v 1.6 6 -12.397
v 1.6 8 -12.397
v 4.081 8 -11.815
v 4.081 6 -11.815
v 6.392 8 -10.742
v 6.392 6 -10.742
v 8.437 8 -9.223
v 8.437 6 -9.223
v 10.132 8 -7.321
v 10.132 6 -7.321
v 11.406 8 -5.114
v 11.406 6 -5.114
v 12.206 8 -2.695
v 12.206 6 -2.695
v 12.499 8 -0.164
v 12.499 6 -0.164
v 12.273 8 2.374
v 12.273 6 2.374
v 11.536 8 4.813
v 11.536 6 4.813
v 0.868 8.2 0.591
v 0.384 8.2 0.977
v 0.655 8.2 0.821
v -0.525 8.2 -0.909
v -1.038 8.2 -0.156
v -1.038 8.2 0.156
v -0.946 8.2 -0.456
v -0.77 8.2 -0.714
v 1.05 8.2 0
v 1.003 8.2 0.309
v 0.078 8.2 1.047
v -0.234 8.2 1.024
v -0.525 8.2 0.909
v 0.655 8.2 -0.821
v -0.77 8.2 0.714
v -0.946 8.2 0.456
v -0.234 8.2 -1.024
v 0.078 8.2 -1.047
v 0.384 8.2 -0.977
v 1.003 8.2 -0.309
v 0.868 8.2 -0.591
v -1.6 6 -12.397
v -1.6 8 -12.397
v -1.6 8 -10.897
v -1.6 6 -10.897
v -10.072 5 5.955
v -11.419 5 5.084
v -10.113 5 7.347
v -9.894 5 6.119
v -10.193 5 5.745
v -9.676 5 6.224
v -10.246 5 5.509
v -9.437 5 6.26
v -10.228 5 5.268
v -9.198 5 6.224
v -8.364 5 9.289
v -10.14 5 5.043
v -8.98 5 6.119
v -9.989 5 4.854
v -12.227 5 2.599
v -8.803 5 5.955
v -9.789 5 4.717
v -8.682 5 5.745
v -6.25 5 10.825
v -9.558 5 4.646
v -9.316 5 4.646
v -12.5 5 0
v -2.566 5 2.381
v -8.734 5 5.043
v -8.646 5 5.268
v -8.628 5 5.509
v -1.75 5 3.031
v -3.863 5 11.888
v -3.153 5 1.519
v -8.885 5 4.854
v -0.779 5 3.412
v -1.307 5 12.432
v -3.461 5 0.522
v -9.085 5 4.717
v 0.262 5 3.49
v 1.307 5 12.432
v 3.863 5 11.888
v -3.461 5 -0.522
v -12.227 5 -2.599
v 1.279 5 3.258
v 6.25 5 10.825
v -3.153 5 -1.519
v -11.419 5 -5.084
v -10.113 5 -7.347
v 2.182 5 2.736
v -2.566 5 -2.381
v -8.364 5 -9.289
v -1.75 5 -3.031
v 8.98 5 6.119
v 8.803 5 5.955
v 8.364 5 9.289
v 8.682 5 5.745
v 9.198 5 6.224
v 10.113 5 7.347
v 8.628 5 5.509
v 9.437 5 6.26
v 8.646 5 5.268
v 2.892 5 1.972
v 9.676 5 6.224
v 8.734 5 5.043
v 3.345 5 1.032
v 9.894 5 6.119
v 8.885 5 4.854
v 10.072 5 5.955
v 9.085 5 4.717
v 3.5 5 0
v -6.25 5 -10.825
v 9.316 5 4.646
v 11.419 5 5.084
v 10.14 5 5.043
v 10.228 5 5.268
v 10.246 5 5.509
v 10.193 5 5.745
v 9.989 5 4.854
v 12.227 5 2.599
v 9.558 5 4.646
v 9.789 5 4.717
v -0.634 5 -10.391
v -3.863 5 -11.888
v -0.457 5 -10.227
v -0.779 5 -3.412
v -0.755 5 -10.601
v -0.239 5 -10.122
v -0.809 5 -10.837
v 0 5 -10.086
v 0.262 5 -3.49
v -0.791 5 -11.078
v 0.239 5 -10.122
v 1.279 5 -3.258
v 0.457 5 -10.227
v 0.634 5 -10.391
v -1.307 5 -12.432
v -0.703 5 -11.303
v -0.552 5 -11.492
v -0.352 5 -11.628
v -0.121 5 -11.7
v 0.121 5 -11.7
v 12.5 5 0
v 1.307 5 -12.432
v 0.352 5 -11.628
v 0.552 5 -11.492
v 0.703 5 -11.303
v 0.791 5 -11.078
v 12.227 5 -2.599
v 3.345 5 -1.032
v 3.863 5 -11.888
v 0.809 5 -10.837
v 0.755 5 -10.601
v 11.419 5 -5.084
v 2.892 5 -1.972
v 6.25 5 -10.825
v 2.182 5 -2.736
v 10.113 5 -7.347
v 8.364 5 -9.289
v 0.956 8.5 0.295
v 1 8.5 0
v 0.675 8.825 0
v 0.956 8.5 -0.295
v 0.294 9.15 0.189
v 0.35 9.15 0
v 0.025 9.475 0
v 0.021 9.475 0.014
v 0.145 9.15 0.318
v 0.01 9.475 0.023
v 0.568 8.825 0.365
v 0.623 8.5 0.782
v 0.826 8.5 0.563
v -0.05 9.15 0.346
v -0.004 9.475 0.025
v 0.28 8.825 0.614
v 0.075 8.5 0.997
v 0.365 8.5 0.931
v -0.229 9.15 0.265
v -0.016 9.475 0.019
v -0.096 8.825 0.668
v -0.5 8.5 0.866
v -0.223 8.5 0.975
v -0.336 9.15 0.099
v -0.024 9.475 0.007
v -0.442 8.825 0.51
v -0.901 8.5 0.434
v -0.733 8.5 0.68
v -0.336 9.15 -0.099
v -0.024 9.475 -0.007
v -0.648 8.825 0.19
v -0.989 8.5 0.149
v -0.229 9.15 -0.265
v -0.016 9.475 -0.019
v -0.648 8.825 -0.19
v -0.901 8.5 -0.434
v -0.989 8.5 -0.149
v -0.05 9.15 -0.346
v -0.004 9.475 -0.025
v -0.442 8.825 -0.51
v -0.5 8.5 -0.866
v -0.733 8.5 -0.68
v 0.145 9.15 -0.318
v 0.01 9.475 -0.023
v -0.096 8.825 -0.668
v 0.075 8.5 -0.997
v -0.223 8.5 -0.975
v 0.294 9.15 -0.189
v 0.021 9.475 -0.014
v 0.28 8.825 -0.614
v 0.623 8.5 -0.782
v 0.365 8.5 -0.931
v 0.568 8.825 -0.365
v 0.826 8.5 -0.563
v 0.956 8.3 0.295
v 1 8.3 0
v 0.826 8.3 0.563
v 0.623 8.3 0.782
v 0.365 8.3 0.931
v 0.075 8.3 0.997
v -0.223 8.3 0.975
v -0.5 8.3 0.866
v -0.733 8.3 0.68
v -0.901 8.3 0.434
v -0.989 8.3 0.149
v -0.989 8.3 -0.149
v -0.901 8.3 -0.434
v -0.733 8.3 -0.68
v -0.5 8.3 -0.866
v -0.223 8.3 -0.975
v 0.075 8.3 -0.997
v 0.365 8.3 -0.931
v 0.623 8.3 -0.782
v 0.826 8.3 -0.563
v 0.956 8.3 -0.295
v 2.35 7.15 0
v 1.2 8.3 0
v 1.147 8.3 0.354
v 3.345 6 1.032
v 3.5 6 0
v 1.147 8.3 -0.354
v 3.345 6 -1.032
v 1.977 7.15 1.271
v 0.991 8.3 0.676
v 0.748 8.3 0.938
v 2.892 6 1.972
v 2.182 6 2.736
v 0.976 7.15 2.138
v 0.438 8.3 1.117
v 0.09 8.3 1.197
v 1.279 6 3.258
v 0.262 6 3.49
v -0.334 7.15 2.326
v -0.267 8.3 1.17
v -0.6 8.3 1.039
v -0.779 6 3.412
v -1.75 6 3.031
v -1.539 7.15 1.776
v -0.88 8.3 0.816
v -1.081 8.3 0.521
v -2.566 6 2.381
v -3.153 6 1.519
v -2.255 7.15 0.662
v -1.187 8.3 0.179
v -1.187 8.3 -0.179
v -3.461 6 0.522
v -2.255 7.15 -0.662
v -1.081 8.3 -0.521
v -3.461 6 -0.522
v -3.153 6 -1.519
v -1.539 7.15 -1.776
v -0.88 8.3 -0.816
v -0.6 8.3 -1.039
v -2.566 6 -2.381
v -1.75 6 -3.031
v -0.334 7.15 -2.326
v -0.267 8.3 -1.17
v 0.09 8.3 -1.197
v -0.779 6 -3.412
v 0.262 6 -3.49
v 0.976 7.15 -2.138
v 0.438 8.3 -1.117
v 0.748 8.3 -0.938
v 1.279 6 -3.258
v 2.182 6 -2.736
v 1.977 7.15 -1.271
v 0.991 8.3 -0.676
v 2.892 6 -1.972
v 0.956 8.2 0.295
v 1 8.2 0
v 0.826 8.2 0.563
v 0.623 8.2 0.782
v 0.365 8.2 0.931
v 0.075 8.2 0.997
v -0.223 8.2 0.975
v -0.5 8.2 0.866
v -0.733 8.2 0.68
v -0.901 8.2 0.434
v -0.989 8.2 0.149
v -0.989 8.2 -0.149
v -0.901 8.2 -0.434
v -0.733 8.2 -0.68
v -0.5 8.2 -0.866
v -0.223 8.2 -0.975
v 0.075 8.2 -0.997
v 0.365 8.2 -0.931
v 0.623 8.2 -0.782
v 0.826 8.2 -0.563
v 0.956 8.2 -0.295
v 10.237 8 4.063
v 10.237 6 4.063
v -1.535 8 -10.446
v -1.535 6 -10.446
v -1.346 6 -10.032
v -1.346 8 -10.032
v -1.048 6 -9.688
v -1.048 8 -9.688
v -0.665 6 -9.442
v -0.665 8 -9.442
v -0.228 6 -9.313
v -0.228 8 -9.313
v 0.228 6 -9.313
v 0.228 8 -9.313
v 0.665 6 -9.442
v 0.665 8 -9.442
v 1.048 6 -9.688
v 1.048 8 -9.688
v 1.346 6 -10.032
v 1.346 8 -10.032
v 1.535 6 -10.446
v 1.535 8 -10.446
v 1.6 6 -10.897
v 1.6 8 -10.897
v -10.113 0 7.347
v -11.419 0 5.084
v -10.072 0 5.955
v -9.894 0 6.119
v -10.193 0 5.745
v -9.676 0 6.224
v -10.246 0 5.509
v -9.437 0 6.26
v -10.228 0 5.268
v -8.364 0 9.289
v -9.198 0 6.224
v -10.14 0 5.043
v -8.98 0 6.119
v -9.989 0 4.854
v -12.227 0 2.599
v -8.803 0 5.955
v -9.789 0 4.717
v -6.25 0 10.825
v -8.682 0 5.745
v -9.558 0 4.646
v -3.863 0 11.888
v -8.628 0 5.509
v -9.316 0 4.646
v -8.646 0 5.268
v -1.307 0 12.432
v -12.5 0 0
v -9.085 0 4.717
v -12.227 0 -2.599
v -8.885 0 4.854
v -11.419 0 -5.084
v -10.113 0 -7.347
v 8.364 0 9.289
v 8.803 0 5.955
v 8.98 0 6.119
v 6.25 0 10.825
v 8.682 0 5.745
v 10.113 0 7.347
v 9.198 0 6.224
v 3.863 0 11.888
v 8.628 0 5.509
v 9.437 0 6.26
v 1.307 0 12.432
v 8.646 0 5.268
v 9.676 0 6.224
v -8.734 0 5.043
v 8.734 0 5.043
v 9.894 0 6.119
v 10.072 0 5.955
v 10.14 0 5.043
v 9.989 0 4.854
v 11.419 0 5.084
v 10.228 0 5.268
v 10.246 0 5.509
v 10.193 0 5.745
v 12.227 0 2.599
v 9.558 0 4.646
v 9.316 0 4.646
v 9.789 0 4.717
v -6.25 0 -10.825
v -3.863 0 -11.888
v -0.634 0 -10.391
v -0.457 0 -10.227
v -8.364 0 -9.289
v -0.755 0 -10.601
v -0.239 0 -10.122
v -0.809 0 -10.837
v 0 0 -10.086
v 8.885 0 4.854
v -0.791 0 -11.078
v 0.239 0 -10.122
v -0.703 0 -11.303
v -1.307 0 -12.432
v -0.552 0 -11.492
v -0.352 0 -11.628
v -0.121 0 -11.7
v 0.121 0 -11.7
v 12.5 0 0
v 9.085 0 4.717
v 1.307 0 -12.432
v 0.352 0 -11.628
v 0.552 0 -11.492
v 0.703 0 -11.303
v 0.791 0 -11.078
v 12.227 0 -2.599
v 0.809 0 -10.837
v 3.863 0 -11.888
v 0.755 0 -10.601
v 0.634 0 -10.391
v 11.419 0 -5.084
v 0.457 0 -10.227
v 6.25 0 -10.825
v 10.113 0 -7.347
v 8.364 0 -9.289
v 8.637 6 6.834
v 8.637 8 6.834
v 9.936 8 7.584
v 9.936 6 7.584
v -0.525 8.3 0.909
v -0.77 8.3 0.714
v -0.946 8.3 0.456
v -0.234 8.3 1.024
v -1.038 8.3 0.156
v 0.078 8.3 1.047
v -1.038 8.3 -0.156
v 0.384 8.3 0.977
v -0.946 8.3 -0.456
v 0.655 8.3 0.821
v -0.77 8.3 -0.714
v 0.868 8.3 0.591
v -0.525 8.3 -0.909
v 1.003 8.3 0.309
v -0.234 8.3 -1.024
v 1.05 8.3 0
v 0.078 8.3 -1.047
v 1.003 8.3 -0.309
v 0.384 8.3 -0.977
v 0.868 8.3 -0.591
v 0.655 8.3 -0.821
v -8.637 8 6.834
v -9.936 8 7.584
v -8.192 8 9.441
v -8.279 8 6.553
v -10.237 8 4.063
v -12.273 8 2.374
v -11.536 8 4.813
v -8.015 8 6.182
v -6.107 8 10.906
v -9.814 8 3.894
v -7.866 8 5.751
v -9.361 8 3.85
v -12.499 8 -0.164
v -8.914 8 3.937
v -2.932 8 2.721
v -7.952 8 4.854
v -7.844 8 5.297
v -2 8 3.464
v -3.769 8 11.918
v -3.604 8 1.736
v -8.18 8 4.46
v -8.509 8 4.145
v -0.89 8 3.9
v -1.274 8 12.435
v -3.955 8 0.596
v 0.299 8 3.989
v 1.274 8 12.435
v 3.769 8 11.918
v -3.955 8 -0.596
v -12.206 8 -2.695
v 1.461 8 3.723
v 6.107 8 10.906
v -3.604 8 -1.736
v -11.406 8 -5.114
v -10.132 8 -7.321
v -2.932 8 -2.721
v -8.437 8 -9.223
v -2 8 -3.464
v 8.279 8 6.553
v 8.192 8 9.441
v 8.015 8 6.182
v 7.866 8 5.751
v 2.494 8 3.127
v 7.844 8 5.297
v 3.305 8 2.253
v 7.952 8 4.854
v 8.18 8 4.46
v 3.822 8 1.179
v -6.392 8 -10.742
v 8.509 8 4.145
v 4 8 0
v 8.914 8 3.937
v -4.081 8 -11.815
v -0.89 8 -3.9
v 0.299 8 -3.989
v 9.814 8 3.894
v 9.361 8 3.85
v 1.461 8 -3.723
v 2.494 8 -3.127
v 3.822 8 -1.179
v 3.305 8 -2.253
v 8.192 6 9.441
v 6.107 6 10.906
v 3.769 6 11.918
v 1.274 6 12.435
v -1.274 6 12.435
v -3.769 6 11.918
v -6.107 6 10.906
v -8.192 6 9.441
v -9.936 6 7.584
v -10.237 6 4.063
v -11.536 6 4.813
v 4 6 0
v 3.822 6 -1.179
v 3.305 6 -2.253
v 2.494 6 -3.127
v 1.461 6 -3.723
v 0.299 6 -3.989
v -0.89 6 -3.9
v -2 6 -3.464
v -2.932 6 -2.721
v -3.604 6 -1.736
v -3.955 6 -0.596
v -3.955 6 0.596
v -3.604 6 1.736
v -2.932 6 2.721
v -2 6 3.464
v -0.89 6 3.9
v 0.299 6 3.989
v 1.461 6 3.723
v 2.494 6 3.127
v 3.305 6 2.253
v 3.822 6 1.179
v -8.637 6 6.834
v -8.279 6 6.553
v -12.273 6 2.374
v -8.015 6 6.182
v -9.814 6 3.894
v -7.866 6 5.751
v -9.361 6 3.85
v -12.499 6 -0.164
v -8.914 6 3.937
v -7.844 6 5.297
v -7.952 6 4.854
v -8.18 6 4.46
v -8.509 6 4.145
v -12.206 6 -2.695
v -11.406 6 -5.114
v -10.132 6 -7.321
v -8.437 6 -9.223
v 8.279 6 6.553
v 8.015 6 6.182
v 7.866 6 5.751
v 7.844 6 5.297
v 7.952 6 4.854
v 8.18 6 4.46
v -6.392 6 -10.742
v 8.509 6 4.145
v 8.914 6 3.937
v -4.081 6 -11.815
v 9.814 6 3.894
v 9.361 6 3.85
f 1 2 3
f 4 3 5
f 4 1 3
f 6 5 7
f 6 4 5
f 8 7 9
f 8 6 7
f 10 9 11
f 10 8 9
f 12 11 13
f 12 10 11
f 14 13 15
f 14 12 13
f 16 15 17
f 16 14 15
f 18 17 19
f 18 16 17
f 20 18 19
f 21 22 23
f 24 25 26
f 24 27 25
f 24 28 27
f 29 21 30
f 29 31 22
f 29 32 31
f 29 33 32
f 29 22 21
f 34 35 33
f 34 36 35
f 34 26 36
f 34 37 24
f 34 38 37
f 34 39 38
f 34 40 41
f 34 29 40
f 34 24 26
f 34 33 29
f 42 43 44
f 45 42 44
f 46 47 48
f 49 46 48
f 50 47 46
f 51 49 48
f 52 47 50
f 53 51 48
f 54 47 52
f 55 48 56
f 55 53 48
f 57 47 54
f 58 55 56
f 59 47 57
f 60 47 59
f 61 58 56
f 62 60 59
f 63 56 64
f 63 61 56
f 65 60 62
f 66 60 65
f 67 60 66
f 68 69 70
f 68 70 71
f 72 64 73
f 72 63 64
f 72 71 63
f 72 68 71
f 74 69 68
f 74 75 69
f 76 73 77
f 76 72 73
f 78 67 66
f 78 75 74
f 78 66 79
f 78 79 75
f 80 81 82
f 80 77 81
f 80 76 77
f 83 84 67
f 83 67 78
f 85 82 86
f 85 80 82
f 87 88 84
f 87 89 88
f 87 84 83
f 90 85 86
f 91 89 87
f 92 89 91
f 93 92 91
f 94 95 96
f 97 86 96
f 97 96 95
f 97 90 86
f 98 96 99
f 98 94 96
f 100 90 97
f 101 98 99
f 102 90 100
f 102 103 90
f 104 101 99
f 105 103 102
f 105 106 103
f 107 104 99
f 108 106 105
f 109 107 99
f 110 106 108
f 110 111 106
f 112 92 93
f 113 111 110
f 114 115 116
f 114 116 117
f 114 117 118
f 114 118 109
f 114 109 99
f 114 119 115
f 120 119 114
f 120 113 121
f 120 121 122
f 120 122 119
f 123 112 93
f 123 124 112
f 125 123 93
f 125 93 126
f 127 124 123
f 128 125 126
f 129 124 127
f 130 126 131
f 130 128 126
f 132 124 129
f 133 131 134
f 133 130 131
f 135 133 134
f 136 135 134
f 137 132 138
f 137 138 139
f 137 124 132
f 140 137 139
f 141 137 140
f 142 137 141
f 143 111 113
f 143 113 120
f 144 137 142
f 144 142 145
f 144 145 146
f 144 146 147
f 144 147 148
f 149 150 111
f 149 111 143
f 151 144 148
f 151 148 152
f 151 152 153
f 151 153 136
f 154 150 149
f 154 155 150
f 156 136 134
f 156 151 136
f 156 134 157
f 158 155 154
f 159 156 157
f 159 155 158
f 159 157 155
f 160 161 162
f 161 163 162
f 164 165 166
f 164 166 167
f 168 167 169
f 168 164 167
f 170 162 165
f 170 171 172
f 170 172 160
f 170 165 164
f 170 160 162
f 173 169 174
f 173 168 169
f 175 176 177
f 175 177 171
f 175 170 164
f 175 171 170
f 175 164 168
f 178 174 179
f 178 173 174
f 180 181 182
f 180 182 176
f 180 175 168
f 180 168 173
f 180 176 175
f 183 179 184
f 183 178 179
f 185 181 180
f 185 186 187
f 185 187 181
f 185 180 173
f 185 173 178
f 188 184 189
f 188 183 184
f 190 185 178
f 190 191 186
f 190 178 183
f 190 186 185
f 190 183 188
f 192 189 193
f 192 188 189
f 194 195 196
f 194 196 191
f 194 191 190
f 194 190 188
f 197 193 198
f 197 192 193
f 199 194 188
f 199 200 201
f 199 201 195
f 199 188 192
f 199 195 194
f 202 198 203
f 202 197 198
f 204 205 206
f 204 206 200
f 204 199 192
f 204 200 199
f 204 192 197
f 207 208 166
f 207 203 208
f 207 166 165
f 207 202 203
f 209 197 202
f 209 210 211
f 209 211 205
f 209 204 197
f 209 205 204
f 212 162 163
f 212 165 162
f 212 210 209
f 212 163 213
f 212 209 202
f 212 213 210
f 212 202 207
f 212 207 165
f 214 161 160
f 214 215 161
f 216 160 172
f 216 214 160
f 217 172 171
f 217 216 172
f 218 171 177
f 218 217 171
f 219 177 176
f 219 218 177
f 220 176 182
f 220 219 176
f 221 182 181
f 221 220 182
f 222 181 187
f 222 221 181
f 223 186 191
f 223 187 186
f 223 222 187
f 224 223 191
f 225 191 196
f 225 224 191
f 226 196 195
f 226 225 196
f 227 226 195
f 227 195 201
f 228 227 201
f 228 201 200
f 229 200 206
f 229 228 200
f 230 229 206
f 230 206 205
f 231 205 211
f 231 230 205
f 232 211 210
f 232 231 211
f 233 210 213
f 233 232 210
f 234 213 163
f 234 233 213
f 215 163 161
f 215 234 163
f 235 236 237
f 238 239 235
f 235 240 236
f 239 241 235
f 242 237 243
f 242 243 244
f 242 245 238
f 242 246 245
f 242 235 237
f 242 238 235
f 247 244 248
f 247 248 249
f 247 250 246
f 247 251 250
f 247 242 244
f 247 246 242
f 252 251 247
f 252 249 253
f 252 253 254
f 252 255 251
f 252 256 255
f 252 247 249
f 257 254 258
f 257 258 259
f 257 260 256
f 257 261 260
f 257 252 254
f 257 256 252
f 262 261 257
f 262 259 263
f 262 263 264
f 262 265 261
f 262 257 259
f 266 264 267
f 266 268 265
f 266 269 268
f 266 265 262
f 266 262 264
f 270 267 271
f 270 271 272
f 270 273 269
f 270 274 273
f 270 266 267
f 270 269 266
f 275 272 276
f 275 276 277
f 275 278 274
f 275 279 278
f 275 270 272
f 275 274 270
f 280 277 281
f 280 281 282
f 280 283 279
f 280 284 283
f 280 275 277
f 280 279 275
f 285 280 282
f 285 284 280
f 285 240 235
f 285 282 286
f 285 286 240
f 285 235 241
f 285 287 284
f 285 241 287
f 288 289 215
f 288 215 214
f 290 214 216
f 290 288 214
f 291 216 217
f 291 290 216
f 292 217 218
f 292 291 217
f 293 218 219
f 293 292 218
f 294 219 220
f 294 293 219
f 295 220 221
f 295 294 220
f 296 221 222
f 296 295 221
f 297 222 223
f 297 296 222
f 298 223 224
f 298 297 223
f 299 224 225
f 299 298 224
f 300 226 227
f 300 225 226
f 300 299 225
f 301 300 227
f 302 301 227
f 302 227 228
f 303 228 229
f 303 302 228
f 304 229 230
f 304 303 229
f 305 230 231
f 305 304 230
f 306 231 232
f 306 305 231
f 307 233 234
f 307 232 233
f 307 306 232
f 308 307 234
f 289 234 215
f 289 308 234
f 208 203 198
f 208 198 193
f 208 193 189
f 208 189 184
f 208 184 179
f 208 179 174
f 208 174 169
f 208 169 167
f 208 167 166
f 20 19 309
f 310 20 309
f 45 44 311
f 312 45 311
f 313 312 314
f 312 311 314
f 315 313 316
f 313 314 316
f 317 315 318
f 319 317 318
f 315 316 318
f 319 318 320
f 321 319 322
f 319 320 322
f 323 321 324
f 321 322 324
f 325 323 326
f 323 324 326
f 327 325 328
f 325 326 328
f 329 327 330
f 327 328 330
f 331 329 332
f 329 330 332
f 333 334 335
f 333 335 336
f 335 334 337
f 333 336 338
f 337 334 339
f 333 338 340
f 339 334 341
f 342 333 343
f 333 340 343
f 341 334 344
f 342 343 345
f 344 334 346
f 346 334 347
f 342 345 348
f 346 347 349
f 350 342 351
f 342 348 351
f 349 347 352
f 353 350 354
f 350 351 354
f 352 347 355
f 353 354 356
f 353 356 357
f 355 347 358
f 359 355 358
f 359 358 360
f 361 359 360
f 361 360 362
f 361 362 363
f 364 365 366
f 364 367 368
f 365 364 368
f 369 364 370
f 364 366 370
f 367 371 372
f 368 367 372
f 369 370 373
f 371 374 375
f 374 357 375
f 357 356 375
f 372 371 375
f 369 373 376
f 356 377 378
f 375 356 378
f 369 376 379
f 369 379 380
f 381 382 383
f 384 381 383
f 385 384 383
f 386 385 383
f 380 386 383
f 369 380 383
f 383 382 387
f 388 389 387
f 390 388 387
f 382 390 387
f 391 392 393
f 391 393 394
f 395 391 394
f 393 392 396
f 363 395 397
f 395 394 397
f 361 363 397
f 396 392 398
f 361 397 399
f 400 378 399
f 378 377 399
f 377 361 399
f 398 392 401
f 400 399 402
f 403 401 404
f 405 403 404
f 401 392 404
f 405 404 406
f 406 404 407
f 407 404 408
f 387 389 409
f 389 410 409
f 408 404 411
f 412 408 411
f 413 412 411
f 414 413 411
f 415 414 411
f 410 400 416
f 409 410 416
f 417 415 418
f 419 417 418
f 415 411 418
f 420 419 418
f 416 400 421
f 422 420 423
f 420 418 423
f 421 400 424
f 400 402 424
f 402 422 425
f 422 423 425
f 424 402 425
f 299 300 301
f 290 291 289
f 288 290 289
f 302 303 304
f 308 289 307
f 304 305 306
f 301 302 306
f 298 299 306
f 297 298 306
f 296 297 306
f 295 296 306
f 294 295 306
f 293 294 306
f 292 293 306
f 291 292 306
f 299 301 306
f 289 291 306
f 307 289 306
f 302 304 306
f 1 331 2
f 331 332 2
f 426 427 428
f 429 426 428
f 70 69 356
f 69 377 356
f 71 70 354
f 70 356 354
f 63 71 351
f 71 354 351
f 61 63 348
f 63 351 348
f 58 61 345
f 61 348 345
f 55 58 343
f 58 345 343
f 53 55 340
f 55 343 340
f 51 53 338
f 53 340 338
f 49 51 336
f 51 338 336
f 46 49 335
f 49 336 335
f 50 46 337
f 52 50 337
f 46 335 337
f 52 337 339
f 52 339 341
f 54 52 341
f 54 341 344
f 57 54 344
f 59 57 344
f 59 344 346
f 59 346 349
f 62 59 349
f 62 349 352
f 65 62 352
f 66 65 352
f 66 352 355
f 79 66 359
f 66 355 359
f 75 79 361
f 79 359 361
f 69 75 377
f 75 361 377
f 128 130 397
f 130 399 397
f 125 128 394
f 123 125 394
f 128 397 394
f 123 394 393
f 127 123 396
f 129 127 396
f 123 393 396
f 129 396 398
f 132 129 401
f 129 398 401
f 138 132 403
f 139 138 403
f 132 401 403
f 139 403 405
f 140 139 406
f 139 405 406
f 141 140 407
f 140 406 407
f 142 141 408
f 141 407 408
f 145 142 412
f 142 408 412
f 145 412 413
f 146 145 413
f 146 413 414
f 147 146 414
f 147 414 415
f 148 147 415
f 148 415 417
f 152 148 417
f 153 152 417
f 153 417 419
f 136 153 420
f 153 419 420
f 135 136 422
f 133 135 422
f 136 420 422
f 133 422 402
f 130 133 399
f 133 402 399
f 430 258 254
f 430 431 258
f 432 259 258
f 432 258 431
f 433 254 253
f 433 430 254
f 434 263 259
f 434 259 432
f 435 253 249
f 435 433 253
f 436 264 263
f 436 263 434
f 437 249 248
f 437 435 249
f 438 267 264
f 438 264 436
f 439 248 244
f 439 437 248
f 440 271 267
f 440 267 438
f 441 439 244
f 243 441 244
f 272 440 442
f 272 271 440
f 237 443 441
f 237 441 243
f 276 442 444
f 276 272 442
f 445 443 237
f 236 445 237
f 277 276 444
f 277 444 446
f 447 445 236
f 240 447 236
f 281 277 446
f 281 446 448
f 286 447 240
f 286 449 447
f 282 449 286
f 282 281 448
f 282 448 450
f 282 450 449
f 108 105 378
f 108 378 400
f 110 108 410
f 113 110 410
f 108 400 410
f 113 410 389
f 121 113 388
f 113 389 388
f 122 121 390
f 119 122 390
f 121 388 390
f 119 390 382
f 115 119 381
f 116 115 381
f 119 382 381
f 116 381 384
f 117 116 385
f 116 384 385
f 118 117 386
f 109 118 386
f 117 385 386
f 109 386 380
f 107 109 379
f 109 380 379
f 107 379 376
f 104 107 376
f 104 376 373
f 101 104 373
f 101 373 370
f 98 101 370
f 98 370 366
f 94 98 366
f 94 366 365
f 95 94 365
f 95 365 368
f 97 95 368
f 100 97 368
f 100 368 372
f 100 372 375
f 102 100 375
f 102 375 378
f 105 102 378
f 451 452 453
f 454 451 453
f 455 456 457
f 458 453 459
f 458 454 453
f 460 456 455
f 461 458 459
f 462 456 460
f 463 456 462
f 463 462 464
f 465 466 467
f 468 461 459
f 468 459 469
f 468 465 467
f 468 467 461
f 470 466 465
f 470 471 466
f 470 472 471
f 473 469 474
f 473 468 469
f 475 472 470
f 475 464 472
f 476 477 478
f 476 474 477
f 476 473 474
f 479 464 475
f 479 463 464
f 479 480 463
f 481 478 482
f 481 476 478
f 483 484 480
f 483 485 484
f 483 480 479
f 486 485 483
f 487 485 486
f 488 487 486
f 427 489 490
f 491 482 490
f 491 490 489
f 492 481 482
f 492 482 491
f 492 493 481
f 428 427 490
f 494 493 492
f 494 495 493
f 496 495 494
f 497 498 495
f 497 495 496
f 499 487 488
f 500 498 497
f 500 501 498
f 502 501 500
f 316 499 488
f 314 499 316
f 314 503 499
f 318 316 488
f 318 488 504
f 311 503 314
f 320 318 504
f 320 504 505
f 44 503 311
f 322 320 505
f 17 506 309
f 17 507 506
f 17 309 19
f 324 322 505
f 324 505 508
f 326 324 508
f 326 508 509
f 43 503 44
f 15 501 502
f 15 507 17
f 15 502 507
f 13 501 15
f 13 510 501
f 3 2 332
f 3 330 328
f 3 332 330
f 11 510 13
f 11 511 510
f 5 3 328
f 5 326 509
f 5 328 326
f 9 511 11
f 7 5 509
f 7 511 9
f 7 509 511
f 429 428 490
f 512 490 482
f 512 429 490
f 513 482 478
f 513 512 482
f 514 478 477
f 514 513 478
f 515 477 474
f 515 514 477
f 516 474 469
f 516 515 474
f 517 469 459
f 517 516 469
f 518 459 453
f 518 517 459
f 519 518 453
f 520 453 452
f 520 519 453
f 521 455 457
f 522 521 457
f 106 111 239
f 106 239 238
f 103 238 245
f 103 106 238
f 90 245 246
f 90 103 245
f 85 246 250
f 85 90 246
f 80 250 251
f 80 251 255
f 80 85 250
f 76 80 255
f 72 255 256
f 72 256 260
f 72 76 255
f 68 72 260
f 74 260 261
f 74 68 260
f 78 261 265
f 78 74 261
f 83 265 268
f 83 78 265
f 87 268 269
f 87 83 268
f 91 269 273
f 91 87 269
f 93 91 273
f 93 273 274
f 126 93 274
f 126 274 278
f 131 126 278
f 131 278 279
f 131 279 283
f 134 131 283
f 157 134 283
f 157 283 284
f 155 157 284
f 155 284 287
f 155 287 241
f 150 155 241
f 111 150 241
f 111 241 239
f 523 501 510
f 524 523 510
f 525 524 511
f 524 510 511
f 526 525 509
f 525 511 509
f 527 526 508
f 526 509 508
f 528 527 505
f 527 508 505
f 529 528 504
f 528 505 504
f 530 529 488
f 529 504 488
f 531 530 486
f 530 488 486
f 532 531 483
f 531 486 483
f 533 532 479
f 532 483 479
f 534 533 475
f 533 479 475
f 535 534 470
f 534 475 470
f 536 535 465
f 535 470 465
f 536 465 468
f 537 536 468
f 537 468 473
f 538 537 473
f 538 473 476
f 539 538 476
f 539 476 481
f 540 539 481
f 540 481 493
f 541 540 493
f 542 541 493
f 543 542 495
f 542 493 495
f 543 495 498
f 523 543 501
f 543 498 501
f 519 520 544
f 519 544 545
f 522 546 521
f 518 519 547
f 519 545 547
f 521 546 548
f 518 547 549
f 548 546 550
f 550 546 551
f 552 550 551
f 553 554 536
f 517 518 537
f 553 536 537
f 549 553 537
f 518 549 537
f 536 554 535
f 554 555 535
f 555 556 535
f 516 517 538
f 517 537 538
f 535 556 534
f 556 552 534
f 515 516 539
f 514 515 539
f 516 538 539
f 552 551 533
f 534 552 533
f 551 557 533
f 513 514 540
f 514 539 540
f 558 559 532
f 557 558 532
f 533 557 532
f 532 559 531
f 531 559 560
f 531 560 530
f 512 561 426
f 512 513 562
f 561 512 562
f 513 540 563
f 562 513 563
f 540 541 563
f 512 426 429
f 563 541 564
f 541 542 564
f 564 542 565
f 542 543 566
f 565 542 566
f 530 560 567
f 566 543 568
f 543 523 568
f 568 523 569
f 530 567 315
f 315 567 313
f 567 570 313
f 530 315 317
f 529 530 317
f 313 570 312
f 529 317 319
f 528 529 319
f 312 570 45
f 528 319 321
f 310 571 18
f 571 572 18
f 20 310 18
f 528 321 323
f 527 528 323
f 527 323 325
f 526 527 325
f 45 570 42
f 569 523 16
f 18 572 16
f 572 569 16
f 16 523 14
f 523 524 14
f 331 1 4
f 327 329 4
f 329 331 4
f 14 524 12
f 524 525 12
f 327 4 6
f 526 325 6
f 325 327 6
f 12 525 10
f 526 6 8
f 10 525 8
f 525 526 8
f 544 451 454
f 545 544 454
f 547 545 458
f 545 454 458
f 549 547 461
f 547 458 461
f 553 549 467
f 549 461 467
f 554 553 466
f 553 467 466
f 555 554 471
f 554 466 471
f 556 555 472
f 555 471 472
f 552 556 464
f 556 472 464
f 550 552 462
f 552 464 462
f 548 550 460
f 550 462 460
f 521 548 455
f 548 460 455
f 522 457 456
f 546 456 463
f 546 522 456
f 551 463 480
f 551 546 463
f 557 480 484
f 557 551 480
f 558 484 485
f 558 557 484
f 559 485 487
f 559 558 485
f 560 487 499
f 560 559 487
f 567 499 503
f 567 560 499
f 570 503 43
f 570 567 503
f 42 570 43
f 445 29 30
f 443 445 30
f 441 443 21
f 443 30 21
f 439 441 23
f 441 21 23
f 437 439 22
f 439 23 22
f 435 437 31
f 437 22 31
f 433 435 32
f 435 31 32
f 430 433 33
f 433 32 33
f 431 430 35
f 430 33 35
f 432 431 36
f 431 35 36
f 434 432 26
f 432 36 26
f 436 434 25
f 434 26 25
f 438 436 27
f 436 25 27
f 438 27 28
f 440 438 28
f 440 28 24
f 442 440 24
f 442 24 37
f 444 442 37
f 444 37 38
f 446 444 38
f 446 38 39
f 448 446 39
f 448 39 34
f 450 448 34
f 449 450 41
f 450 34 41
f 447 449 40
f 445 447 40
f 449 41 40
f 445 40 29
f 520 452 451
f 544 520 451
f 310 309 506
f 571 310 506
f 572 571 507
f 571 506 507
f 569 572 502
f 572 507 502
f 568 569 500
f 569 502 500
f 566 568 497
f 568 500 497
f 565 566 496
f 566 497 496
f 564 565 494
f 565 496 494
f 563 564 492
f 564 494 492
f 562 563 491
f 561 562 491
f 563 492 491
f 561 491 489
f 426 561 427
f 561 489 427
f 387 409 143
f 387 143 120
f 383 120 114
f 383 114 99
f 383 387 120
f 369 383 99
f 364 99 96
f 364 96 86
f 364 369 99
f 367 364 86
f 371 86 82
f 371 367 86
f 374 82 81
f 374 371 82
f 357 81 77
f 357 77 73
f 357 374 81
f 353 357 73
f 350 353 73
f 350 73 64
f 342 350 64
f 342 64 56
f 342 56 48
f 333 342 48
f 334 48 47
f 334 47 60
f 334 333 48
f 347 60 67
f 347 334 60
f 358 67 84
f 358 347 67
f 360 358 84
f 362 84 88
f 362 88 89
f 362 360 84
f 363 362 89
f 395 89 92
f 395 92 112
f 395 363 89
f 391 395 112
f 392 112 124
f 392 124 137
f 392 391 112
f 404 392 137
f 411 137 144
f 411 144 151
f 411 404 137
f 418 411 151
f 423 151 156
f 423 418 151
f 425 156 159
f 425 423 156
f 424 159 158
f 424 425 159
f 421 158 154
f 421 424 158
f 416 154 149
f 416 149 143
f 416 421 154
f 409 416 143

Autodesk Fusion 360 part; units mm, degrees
sketch "Sketch1" plane through (0, 0, 0) normal (0, 0, 1) x (1, 0, 0)
  line L0 (0, 0) -> (0, 9.5)
  line L1 (0, 9.5) -> (3.5, 6)
  line L2 (3.5, 6) -> (3.5, 5)
  line L3 (3.5, 5) -> (12.5, 5)
  line L4 (12.5, 5) -> (12.5, 0)
  line L5 (12.5, 0) -> (0, 0)
  line L6 (0, 9.475) -> (0.025, 9.475)
  line L7 (12.5, 8) -> (12.5, 6)
  line L8 (12.5, 6) -> (4, 6)
  line L9 (4, 6) -> (4, 8)
  line L10 (4, 8) -> (12.5, 8)
  line L11 (1, 8.5) -> (1, 8.2)
  line L12 (1, 8.2) -> (0, 8.2)
  line L13 (1, 8.3) -> (1.2, 8.3)
  dimension "d1" = 12.5
  dimension "d2" = 3.5
  dimension "d3" = 45
  dimension "d4" = 1
  dimension "d5" = 5
  dimension "d7" = 0.025
  dimension "d8" = 8.5
  dimension "d10" = 2
  dimension "d20" = 1
  dimension "d21" = 1.3
  dimension "d22" = 0.1
revolve "Revolve1" add sketch "Sketch1" angle 360 about axis through (0, 0, 0) along (0, 1, 0) contours L0 L1 L2 L3 L4 L5 L11 L12 L13 | L7 L8 L9 L10 makes body 1 at (-3.3879, 0, 0.621) makes body 2 at (9.6201, 8, 0.621)
sketch "Sketch3" plane through (0, 8, 0) normal (0, 1, 0) x (-1, 0, 0)
  circle A0 centre (0, 0) radius 4
  circle A1 centre (0, 0) radius 12.5
  circle A2 centre (0, 0) radius 12.5
  line L0 (1.6, -12.3972) -> (1.6, -10.8972)
  arc A3 (1.6, -10.8972) -> (-1.6, -10.8972) centre (0, -10.8972) ccw
  line L1 (-1.6, -10.8972) -> (-1.6, -12.3972)
  dimension "d11" = 1.6
  dimension "d12" = 1.5
extrude "Extrude1" cut sketch "Sketch3" against normal blind 2 contours A1 A2 L0 A3 L1 picked at (-0.1782, -11.4276) bodies 2
hole "Hole1" at (0, 8, -10.8972) direction (0, -1, 0) diameter 1.623 depth 10 tip angle 118 bodies 1
pattern_circular "C-Pattern1" count 3 over 360 about axis through (0, 1.75, 0) along (0, 1, 0) of "Extrude1", "Hole1"
revolve "Revolve2" add sketch "Sketch1" angle 360 about axis through (0, 0, 0) along (0, 1, 0) separate body contours L0 L1 L6 L11 L12 makes body 3
move_face "OffsetFaces1" offset -0.05 1 faces at (0.9988, 8.2667, 0.0498) on bodies 1
copy_body "Body->Comp1" bodies 1 removing the originals makes body 4 in component "form"
copy_body "Body->Comp2" bodies 2 removing the originals makes body 5 in component "clamp"
copy_body "Body->Comp3" bodies 3 removing the originals makes body 6 in component "thorn"
component "form" placed x (1, 0, 0) y (0, 1, 0) z (0, 0, 1) at (0, 0, 0)
component "clamp" placed x (1, 0, 0) y (0, 1, 0) z (0, 0, 1) at (0, 0, 0)
component "thorn" placed x (1, 0, 0) y (0, 1, 0) z (0, 0, 1) at (0, 0, 0)
